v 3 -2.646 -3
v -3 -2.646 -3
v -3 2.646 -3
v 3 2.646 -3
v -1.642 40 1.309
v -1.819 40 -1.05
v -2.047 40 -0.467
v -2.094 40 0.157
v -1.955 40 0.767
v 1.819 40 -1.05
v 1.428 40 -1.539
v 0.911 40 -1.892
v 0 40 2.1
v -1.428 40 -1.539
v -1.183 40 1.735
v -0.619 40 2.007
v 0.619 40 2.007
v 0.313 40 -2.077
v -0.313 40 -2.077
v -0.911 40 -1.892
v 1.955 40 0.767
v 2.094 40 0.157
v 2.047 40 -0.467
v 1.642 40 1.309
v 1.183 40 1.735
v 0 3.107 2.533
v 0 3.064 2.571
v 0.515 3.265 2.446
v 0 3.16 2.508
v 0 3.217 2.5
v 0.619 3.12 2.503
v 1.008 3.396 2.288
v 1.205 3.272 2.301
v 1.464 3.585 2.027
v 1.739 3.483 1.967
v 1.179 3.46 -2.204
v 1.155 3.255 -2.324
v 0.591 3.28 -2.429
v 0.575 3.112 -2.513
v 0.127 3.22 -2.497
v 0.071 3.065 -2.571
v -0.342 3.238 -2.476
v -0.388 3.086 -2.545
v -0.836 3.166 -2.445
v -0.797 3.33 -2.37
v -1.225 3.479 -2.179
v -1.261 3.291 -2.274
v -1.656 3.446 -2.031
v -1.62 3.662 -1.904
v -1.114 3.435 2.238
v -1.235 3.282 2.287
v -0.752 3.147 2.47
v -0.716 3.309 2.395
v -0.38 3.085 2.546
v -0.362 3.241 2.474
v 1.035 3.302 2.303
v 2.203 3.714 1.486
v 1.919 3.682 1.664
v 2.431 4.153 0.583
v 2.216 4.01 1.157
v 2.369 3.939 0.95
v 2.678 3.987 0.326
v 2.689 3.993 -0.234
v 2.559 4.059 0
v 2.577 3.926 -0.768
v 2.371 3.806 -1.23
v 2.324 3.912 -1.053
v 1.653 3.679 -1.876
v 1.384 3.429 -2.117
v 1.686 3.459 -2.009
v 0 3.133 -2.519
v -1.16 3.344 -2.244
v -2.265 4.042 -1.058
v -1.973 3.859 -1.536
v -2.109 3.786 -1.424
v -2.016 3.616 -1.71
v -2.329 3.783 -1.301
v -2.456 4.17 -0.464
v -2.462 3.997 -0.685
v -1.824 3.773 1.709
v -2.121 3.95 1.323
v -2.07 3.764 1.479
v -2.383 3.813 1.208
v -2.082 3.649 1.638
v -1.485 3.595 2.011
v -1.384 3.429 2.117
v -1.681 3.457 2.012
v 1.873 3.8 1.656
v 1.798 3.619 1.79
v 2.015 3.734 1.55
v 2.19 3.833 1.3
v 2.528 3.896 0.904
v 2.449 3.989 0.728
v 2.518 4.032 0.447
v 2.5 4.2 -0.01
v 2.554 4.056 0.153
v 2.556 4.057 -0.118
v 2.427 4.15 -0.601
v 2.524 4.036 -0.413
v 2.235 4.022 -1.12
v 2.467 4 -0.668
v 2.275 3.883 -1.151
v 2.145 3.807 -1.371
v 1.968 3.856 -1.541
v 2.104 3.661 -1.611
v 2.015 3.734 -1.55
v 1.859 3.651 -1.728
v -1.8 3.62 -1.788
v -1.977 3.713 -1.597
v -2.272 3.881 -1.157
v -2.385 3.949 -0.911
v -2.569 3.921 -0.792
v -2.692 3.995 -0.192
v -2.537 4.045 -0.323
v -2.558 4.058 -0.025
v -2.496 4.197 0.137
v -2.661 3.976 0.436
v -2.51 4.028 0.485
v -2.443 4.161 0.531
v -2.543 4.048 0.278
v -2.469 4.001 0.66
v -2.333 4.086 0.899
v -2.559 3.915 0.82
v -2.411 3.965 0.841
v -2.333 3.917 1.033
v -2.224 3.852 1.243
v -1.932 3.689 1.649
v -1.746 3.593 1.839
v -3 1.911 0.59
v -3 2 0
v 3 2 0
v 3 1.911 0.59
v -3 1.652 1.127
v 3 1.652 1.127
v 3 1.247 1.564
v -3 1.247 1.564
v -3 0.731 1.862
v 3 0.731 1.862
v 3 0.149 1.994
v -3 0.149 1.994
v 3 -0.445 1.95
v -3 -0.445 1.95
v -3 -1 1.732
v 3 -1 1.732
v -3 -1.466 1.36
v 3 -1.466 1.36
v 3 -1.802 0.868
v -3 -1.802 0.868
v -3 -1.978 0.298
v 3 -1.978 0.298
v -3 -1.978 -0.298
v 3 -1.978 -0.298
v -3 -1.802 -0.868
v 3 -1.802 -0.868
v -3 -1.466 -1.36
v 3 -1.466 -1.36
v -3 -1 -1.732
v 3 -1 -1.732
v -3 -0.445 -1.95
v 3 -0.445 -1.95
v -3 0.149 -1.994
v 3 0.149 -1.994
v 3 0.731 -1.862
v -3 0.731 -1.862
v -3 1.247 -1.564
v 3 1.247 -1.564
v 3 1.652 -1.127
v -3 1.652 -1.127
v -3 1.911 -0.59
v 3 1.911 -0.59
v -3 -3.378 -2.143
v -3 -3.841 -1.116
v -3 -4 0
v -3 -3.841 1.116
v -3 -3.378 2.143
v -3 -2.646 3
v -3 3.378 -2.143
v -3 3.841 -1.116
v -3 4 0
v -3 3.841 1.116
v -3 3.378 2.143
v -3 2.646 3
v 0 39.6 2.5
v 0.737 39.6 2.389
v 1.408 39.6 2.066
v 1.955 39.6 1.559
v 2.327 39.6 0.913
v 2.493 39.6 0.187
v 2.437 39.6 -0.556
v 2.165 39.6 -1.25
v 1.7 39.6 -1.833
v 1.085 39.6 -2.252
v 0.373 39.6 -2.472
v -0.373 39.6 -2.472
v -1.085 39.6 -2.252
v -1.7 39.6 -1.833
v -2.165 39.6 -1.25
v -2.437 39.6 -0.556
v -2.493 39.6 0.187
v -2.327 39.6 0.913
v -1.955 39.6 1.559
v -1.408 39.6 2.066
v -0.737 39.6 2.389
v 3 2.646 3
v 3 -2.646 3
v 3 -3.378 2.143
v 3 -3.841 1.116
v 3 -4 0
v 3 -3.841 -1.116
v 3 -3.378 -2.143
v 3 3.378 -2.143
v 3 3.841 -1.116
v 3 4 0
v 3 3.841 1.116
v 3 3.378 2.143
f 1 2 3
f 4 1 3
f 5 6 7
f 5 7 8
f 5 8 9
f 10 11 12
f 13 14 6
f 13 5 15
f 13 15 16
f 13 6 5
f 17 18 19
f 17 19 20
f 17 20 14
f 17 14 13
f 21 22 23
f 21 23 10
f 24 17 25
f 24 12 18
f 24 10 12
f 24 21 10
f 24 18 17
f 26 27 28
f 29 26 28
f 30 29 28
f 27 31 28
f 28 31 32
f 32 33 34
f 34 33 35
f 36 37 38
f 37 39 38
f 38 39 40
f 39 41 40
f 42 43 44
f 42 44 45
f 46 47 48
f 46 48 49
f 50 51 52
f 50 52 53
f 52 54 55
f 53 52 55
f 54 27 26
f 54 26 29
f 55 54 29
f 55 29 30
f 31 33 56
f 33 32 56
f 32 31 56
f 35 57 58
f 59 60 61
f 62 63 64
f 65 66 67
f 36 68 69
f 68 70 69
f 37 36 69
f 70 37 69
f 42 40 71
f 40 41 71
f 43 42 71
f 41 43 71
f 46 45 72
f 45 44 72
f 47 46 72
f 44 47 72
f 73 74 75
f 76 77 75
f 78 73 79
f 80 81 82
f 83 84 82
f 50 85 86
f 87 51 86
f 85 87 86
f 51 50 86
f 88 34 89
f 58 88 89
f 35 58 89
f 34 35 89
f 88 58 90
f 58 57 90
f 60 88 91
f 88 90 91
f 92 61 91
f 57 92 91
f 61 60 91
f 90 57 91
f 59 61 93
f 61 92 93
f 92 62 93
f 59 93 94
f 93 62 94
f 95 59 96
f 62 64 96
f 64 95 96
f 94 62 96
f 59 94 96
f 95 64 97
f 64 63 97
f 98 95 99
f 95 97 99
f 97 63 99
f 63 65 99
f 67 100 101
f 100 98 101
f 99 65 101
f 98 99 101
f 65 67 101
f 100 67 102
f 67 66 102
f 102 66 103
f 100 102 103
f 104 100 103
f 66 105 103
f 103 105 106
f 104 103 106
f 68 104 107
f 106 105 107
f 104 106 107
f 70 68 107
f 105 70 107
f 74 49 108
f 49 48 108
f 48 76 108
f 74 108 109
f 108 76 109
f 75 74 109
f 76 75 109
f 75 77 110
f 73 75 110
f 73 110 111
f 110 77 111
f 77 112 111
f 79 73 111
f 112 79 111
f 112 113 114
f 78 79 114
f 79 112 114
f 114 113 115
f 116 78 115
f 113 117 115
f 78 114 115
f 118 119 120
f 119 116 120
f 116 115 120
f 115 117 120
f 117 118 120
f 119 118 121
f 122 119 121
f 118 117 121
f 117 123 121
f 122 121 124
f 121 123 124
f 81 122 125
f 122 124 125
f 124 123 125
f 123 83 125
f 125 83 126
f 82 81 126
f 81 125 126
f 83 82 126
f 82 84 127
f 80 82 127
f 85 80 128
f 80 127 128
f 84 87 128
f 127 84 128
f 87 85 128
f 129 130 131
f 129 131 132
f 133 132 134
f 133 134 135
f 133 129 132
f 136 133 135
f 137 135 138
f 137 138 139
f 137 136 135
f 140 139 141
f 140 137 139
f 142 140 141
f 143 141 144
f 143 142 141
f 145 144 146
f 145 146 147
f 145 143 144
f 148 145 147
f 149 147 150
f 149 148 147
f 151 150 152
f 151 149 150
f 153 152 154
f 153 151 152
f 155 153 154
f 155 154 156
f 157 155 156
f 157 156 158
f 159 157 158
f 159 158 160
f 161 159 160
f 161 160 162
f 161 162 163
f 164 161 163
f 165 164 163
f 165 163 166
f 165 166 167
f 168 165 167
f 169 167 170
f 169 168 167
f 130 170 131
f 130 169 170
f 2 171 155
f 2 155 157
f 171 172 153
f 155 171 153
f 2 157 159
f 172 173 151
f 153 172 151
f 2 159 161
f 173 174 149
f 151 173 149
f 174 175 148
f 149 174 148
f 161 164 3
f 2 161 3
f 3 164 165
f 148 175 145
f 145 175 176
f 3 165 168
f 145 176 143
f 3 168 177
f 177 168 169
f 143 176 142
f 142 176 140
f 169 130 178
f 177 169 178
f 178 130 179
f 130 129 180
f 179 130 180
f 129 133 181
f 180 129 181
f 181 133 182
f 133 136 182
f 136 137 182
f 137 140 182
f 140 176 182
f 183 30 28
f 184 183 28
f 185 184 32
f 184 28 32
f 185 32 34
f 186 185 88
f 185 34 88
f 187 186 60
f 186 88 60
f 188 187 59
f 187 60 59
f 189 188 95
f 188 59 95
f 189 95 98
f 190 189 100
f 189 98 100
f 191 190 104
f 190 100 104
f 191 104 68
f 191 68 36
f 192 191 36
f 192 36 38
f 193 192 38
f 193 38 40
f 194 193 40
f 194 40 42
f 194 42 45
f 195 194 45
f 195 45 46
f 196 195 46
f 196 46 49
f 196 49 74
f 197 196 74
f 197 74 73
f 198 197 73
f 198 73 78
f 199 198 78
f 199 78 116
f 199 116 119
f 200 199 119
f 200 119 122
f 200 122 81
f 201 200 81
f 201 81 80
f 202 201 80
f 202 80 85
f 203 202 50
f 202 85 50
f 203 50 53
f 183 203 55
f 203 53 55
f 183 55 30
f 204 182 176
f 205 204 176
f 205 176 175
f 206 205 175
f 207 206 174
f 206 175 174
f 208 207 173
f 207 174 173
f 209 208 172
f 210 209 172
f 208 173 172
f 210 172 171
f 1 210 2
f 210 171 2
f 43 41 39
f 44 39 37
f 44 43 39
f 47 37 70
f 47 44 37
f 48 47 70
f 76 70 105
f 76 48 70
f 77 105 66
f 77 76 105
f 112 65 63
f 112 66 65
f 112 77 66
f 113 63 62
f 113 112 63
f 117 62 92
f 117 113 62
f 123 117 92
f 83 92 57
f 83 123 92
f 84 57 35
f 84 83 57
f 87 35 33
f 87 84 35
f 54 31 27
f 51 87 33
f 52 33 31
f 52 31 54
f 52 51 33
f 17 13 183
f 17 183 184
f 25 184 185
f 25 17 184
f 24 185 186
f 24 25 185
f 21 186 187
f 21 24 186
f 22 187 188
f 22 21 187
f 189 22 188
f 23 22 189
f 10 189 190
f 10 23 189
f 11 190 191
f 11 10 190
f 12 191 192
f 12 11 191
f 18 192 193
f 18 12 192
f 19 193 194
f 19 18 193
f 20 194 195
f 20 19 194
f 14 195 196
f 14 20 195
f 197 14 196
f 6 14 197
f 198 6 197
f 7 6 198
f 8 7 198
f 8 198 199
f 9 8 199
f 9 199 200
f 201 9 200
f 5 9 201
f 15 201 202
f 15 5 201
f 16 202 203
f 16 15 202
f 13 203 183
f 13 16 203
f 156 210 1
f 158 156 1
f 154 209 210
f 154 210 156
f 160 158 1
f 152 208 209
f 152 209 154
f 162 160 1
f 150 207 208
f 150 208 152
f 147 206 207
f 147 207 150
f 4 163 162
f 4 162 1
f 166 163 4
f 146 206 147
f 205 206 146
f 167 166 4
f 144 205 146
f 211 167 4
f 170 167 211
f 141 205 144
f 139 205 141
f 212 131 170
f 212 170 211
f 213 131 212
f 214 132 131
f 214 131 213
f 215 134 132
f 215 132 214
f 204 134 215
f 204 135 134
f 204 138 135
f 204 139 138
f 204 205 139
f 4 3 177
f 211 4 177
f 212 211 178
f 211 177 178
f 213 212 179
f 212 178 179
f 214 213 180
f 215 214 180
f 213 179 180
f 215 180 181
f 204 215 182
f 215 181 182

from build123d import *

# Parameters (mm, degrees)
SKETCH1_R           = 2.5
BOSS_EXTRUDE1_DEPTH = 40
SKETCH2_R           = 4
BOSS_EXTRUDE2_DEPTH = 3
CUT_EXTRUDE1_START  = -6
CUT_EXTRUDE1_DEPTH  = 6
SKETCH5_R           = 2
CUT_EXTRUDE2_DEPTH  = 41.558599702
FILLET1_R           = 0.2
CHAMFER1_SIZE       = 0.4
SPLIT1_START        = -3
SPLIT1_OUTLINE_R    = 2
SPLIT1_DEPTH        = 6
SPLIT1_2_OUTLINE_R  = 2
SPLIT1_2_DEPTH      = 6


# Read off the part's stored shape, not the designer's step: Split1
with BuildPart() as part:
    # Sketch1 → Boss-Extrude1 (new body)
    with BuildSketch(Plane(origin=(0, 0, 0), x_dir=(1, 0, 0), z_dir=(0, 1, 0))):
        with Locations(Location((0, 0, 0), (0, 0, 270))):
            Circle(SKETCH1_R)
    extrude(amount=BOSS_EXTRUDE1_DEPTH)

    # Sketch2 → Boss-Extrude2 (add, symmetric)
    with BuildSketch(Plane(origin=(0, 0, 0), x_dir=(0, 0, -1), z_dir=(1, 0, 0))):
        Circle(SKETCH2_R)
    extrude(amount=BOSS_EXTRUDE2_DEPTH, both=True)

    # Sketch3 → Cut-Extrude1 (cut)
    with BuildSketch(Plane.ZY.offset(3).offset(CUT_EXTRUDE1_START)):
        with BuildLine():
            ThreePointArc((-3, 2.645751311), (-4, 0), (-3, -2.645751311))
            Line((-3, -2.645751311), (-3, 2.645751311))
        make_face()
        with BuildLine():
            Line((3, 2.645751311), (3, -2.645751311))
            ThreePointArc((3, -2.645751311), (3.741657387, -1.414213562), (4, 0))
            ThreePointArc((4, 0), (3.741657387, 1.414213562), (3, 2.645751311))
        make_face()
    extrude(amount=CUT_EXTRUDE1_DEPTH, mode=Mode.SUBTRACT)

    # Sketch5 → Cut-Extrude2 (cut, through all)
    with BuildSketch(Plane.ZY.offset(3)):
        Circle(SKETCH5_R)
    extrude(amount=-CUT_EXTRUDE2_DEPTH, mode=Mode.SUBTRACT)

    # Fillet1
    fillet1_edges = [part.edges().sort_by_distance(p)[0] for p in [
        (0, 3.122498999, -2.5),
    ]]
    fillet(fillet1_edges, radius=FILLET1_R)

    # Chamfer1
    chamfer1_edges = [part.edges().sort_by_distance(p)[0] for p in [
        (0, 40, -2.5),
    ]]
    chamfer(chamfer1_edges, length=CHAMFER1_SIZE)

    # Split1 2 outline → Split1 2 (cut)
    with BuildSketch(Plane.YZ.offset(SPLIT1_START)):
        with BuildLine():
            ThreePointArc((3.063858732, -2.571530609), (3.999999989, 0.000302983), (3.063469131, 2.571994728))
            ThreePointArc((3.063469131, 2.571994728), (2.86262059, 2.793815197), (2.645751311, 3))
            Line((2.645751311, 3), (-2.645751311, 3))
            ThreePointArc((-2.645751311, 3), (-4, 0), (-2.645751311, -3))
            Line((-2.645751311, -3), (2.645751311, -3))
            ThreePointArc((2.645751311, -3), (2.862832202, -2.793598358), (3.063858732, -2.571530609))
        make_face()
        Circle(SPLIT1_2_OUTLINE_R, mode=Mode.SUBTRACT)
    extrude(amount=SPLIT1_2_DEPTH, mode=Mode.SUBTRACT)


with BuildPart() as body_2:
    # Split1 outline → Split1 (new body)
    with BuildSketch(Plane.YZ.offset(SPLIT1_START)):
        with BuildLine():
            ThreePointArc((2.645751311, -3), (4, 0), (2.645751311, 3))
            Line((2.645751311, 3), (-2.645751311, 3))
            ThreePointArc((-2.645751311, 3), (-4, 0), (-2.645751311, -3))
            Line((-2.645751311, -3), (2.645751311, -3))
        make_face()
        Circle(SPLIT1_OUTLINE_R, mode=Mode.SUBTRACT)
    extrude(amount=SPLIT1_DEPTH)


solid = Compound([part.part, body_2.part])
